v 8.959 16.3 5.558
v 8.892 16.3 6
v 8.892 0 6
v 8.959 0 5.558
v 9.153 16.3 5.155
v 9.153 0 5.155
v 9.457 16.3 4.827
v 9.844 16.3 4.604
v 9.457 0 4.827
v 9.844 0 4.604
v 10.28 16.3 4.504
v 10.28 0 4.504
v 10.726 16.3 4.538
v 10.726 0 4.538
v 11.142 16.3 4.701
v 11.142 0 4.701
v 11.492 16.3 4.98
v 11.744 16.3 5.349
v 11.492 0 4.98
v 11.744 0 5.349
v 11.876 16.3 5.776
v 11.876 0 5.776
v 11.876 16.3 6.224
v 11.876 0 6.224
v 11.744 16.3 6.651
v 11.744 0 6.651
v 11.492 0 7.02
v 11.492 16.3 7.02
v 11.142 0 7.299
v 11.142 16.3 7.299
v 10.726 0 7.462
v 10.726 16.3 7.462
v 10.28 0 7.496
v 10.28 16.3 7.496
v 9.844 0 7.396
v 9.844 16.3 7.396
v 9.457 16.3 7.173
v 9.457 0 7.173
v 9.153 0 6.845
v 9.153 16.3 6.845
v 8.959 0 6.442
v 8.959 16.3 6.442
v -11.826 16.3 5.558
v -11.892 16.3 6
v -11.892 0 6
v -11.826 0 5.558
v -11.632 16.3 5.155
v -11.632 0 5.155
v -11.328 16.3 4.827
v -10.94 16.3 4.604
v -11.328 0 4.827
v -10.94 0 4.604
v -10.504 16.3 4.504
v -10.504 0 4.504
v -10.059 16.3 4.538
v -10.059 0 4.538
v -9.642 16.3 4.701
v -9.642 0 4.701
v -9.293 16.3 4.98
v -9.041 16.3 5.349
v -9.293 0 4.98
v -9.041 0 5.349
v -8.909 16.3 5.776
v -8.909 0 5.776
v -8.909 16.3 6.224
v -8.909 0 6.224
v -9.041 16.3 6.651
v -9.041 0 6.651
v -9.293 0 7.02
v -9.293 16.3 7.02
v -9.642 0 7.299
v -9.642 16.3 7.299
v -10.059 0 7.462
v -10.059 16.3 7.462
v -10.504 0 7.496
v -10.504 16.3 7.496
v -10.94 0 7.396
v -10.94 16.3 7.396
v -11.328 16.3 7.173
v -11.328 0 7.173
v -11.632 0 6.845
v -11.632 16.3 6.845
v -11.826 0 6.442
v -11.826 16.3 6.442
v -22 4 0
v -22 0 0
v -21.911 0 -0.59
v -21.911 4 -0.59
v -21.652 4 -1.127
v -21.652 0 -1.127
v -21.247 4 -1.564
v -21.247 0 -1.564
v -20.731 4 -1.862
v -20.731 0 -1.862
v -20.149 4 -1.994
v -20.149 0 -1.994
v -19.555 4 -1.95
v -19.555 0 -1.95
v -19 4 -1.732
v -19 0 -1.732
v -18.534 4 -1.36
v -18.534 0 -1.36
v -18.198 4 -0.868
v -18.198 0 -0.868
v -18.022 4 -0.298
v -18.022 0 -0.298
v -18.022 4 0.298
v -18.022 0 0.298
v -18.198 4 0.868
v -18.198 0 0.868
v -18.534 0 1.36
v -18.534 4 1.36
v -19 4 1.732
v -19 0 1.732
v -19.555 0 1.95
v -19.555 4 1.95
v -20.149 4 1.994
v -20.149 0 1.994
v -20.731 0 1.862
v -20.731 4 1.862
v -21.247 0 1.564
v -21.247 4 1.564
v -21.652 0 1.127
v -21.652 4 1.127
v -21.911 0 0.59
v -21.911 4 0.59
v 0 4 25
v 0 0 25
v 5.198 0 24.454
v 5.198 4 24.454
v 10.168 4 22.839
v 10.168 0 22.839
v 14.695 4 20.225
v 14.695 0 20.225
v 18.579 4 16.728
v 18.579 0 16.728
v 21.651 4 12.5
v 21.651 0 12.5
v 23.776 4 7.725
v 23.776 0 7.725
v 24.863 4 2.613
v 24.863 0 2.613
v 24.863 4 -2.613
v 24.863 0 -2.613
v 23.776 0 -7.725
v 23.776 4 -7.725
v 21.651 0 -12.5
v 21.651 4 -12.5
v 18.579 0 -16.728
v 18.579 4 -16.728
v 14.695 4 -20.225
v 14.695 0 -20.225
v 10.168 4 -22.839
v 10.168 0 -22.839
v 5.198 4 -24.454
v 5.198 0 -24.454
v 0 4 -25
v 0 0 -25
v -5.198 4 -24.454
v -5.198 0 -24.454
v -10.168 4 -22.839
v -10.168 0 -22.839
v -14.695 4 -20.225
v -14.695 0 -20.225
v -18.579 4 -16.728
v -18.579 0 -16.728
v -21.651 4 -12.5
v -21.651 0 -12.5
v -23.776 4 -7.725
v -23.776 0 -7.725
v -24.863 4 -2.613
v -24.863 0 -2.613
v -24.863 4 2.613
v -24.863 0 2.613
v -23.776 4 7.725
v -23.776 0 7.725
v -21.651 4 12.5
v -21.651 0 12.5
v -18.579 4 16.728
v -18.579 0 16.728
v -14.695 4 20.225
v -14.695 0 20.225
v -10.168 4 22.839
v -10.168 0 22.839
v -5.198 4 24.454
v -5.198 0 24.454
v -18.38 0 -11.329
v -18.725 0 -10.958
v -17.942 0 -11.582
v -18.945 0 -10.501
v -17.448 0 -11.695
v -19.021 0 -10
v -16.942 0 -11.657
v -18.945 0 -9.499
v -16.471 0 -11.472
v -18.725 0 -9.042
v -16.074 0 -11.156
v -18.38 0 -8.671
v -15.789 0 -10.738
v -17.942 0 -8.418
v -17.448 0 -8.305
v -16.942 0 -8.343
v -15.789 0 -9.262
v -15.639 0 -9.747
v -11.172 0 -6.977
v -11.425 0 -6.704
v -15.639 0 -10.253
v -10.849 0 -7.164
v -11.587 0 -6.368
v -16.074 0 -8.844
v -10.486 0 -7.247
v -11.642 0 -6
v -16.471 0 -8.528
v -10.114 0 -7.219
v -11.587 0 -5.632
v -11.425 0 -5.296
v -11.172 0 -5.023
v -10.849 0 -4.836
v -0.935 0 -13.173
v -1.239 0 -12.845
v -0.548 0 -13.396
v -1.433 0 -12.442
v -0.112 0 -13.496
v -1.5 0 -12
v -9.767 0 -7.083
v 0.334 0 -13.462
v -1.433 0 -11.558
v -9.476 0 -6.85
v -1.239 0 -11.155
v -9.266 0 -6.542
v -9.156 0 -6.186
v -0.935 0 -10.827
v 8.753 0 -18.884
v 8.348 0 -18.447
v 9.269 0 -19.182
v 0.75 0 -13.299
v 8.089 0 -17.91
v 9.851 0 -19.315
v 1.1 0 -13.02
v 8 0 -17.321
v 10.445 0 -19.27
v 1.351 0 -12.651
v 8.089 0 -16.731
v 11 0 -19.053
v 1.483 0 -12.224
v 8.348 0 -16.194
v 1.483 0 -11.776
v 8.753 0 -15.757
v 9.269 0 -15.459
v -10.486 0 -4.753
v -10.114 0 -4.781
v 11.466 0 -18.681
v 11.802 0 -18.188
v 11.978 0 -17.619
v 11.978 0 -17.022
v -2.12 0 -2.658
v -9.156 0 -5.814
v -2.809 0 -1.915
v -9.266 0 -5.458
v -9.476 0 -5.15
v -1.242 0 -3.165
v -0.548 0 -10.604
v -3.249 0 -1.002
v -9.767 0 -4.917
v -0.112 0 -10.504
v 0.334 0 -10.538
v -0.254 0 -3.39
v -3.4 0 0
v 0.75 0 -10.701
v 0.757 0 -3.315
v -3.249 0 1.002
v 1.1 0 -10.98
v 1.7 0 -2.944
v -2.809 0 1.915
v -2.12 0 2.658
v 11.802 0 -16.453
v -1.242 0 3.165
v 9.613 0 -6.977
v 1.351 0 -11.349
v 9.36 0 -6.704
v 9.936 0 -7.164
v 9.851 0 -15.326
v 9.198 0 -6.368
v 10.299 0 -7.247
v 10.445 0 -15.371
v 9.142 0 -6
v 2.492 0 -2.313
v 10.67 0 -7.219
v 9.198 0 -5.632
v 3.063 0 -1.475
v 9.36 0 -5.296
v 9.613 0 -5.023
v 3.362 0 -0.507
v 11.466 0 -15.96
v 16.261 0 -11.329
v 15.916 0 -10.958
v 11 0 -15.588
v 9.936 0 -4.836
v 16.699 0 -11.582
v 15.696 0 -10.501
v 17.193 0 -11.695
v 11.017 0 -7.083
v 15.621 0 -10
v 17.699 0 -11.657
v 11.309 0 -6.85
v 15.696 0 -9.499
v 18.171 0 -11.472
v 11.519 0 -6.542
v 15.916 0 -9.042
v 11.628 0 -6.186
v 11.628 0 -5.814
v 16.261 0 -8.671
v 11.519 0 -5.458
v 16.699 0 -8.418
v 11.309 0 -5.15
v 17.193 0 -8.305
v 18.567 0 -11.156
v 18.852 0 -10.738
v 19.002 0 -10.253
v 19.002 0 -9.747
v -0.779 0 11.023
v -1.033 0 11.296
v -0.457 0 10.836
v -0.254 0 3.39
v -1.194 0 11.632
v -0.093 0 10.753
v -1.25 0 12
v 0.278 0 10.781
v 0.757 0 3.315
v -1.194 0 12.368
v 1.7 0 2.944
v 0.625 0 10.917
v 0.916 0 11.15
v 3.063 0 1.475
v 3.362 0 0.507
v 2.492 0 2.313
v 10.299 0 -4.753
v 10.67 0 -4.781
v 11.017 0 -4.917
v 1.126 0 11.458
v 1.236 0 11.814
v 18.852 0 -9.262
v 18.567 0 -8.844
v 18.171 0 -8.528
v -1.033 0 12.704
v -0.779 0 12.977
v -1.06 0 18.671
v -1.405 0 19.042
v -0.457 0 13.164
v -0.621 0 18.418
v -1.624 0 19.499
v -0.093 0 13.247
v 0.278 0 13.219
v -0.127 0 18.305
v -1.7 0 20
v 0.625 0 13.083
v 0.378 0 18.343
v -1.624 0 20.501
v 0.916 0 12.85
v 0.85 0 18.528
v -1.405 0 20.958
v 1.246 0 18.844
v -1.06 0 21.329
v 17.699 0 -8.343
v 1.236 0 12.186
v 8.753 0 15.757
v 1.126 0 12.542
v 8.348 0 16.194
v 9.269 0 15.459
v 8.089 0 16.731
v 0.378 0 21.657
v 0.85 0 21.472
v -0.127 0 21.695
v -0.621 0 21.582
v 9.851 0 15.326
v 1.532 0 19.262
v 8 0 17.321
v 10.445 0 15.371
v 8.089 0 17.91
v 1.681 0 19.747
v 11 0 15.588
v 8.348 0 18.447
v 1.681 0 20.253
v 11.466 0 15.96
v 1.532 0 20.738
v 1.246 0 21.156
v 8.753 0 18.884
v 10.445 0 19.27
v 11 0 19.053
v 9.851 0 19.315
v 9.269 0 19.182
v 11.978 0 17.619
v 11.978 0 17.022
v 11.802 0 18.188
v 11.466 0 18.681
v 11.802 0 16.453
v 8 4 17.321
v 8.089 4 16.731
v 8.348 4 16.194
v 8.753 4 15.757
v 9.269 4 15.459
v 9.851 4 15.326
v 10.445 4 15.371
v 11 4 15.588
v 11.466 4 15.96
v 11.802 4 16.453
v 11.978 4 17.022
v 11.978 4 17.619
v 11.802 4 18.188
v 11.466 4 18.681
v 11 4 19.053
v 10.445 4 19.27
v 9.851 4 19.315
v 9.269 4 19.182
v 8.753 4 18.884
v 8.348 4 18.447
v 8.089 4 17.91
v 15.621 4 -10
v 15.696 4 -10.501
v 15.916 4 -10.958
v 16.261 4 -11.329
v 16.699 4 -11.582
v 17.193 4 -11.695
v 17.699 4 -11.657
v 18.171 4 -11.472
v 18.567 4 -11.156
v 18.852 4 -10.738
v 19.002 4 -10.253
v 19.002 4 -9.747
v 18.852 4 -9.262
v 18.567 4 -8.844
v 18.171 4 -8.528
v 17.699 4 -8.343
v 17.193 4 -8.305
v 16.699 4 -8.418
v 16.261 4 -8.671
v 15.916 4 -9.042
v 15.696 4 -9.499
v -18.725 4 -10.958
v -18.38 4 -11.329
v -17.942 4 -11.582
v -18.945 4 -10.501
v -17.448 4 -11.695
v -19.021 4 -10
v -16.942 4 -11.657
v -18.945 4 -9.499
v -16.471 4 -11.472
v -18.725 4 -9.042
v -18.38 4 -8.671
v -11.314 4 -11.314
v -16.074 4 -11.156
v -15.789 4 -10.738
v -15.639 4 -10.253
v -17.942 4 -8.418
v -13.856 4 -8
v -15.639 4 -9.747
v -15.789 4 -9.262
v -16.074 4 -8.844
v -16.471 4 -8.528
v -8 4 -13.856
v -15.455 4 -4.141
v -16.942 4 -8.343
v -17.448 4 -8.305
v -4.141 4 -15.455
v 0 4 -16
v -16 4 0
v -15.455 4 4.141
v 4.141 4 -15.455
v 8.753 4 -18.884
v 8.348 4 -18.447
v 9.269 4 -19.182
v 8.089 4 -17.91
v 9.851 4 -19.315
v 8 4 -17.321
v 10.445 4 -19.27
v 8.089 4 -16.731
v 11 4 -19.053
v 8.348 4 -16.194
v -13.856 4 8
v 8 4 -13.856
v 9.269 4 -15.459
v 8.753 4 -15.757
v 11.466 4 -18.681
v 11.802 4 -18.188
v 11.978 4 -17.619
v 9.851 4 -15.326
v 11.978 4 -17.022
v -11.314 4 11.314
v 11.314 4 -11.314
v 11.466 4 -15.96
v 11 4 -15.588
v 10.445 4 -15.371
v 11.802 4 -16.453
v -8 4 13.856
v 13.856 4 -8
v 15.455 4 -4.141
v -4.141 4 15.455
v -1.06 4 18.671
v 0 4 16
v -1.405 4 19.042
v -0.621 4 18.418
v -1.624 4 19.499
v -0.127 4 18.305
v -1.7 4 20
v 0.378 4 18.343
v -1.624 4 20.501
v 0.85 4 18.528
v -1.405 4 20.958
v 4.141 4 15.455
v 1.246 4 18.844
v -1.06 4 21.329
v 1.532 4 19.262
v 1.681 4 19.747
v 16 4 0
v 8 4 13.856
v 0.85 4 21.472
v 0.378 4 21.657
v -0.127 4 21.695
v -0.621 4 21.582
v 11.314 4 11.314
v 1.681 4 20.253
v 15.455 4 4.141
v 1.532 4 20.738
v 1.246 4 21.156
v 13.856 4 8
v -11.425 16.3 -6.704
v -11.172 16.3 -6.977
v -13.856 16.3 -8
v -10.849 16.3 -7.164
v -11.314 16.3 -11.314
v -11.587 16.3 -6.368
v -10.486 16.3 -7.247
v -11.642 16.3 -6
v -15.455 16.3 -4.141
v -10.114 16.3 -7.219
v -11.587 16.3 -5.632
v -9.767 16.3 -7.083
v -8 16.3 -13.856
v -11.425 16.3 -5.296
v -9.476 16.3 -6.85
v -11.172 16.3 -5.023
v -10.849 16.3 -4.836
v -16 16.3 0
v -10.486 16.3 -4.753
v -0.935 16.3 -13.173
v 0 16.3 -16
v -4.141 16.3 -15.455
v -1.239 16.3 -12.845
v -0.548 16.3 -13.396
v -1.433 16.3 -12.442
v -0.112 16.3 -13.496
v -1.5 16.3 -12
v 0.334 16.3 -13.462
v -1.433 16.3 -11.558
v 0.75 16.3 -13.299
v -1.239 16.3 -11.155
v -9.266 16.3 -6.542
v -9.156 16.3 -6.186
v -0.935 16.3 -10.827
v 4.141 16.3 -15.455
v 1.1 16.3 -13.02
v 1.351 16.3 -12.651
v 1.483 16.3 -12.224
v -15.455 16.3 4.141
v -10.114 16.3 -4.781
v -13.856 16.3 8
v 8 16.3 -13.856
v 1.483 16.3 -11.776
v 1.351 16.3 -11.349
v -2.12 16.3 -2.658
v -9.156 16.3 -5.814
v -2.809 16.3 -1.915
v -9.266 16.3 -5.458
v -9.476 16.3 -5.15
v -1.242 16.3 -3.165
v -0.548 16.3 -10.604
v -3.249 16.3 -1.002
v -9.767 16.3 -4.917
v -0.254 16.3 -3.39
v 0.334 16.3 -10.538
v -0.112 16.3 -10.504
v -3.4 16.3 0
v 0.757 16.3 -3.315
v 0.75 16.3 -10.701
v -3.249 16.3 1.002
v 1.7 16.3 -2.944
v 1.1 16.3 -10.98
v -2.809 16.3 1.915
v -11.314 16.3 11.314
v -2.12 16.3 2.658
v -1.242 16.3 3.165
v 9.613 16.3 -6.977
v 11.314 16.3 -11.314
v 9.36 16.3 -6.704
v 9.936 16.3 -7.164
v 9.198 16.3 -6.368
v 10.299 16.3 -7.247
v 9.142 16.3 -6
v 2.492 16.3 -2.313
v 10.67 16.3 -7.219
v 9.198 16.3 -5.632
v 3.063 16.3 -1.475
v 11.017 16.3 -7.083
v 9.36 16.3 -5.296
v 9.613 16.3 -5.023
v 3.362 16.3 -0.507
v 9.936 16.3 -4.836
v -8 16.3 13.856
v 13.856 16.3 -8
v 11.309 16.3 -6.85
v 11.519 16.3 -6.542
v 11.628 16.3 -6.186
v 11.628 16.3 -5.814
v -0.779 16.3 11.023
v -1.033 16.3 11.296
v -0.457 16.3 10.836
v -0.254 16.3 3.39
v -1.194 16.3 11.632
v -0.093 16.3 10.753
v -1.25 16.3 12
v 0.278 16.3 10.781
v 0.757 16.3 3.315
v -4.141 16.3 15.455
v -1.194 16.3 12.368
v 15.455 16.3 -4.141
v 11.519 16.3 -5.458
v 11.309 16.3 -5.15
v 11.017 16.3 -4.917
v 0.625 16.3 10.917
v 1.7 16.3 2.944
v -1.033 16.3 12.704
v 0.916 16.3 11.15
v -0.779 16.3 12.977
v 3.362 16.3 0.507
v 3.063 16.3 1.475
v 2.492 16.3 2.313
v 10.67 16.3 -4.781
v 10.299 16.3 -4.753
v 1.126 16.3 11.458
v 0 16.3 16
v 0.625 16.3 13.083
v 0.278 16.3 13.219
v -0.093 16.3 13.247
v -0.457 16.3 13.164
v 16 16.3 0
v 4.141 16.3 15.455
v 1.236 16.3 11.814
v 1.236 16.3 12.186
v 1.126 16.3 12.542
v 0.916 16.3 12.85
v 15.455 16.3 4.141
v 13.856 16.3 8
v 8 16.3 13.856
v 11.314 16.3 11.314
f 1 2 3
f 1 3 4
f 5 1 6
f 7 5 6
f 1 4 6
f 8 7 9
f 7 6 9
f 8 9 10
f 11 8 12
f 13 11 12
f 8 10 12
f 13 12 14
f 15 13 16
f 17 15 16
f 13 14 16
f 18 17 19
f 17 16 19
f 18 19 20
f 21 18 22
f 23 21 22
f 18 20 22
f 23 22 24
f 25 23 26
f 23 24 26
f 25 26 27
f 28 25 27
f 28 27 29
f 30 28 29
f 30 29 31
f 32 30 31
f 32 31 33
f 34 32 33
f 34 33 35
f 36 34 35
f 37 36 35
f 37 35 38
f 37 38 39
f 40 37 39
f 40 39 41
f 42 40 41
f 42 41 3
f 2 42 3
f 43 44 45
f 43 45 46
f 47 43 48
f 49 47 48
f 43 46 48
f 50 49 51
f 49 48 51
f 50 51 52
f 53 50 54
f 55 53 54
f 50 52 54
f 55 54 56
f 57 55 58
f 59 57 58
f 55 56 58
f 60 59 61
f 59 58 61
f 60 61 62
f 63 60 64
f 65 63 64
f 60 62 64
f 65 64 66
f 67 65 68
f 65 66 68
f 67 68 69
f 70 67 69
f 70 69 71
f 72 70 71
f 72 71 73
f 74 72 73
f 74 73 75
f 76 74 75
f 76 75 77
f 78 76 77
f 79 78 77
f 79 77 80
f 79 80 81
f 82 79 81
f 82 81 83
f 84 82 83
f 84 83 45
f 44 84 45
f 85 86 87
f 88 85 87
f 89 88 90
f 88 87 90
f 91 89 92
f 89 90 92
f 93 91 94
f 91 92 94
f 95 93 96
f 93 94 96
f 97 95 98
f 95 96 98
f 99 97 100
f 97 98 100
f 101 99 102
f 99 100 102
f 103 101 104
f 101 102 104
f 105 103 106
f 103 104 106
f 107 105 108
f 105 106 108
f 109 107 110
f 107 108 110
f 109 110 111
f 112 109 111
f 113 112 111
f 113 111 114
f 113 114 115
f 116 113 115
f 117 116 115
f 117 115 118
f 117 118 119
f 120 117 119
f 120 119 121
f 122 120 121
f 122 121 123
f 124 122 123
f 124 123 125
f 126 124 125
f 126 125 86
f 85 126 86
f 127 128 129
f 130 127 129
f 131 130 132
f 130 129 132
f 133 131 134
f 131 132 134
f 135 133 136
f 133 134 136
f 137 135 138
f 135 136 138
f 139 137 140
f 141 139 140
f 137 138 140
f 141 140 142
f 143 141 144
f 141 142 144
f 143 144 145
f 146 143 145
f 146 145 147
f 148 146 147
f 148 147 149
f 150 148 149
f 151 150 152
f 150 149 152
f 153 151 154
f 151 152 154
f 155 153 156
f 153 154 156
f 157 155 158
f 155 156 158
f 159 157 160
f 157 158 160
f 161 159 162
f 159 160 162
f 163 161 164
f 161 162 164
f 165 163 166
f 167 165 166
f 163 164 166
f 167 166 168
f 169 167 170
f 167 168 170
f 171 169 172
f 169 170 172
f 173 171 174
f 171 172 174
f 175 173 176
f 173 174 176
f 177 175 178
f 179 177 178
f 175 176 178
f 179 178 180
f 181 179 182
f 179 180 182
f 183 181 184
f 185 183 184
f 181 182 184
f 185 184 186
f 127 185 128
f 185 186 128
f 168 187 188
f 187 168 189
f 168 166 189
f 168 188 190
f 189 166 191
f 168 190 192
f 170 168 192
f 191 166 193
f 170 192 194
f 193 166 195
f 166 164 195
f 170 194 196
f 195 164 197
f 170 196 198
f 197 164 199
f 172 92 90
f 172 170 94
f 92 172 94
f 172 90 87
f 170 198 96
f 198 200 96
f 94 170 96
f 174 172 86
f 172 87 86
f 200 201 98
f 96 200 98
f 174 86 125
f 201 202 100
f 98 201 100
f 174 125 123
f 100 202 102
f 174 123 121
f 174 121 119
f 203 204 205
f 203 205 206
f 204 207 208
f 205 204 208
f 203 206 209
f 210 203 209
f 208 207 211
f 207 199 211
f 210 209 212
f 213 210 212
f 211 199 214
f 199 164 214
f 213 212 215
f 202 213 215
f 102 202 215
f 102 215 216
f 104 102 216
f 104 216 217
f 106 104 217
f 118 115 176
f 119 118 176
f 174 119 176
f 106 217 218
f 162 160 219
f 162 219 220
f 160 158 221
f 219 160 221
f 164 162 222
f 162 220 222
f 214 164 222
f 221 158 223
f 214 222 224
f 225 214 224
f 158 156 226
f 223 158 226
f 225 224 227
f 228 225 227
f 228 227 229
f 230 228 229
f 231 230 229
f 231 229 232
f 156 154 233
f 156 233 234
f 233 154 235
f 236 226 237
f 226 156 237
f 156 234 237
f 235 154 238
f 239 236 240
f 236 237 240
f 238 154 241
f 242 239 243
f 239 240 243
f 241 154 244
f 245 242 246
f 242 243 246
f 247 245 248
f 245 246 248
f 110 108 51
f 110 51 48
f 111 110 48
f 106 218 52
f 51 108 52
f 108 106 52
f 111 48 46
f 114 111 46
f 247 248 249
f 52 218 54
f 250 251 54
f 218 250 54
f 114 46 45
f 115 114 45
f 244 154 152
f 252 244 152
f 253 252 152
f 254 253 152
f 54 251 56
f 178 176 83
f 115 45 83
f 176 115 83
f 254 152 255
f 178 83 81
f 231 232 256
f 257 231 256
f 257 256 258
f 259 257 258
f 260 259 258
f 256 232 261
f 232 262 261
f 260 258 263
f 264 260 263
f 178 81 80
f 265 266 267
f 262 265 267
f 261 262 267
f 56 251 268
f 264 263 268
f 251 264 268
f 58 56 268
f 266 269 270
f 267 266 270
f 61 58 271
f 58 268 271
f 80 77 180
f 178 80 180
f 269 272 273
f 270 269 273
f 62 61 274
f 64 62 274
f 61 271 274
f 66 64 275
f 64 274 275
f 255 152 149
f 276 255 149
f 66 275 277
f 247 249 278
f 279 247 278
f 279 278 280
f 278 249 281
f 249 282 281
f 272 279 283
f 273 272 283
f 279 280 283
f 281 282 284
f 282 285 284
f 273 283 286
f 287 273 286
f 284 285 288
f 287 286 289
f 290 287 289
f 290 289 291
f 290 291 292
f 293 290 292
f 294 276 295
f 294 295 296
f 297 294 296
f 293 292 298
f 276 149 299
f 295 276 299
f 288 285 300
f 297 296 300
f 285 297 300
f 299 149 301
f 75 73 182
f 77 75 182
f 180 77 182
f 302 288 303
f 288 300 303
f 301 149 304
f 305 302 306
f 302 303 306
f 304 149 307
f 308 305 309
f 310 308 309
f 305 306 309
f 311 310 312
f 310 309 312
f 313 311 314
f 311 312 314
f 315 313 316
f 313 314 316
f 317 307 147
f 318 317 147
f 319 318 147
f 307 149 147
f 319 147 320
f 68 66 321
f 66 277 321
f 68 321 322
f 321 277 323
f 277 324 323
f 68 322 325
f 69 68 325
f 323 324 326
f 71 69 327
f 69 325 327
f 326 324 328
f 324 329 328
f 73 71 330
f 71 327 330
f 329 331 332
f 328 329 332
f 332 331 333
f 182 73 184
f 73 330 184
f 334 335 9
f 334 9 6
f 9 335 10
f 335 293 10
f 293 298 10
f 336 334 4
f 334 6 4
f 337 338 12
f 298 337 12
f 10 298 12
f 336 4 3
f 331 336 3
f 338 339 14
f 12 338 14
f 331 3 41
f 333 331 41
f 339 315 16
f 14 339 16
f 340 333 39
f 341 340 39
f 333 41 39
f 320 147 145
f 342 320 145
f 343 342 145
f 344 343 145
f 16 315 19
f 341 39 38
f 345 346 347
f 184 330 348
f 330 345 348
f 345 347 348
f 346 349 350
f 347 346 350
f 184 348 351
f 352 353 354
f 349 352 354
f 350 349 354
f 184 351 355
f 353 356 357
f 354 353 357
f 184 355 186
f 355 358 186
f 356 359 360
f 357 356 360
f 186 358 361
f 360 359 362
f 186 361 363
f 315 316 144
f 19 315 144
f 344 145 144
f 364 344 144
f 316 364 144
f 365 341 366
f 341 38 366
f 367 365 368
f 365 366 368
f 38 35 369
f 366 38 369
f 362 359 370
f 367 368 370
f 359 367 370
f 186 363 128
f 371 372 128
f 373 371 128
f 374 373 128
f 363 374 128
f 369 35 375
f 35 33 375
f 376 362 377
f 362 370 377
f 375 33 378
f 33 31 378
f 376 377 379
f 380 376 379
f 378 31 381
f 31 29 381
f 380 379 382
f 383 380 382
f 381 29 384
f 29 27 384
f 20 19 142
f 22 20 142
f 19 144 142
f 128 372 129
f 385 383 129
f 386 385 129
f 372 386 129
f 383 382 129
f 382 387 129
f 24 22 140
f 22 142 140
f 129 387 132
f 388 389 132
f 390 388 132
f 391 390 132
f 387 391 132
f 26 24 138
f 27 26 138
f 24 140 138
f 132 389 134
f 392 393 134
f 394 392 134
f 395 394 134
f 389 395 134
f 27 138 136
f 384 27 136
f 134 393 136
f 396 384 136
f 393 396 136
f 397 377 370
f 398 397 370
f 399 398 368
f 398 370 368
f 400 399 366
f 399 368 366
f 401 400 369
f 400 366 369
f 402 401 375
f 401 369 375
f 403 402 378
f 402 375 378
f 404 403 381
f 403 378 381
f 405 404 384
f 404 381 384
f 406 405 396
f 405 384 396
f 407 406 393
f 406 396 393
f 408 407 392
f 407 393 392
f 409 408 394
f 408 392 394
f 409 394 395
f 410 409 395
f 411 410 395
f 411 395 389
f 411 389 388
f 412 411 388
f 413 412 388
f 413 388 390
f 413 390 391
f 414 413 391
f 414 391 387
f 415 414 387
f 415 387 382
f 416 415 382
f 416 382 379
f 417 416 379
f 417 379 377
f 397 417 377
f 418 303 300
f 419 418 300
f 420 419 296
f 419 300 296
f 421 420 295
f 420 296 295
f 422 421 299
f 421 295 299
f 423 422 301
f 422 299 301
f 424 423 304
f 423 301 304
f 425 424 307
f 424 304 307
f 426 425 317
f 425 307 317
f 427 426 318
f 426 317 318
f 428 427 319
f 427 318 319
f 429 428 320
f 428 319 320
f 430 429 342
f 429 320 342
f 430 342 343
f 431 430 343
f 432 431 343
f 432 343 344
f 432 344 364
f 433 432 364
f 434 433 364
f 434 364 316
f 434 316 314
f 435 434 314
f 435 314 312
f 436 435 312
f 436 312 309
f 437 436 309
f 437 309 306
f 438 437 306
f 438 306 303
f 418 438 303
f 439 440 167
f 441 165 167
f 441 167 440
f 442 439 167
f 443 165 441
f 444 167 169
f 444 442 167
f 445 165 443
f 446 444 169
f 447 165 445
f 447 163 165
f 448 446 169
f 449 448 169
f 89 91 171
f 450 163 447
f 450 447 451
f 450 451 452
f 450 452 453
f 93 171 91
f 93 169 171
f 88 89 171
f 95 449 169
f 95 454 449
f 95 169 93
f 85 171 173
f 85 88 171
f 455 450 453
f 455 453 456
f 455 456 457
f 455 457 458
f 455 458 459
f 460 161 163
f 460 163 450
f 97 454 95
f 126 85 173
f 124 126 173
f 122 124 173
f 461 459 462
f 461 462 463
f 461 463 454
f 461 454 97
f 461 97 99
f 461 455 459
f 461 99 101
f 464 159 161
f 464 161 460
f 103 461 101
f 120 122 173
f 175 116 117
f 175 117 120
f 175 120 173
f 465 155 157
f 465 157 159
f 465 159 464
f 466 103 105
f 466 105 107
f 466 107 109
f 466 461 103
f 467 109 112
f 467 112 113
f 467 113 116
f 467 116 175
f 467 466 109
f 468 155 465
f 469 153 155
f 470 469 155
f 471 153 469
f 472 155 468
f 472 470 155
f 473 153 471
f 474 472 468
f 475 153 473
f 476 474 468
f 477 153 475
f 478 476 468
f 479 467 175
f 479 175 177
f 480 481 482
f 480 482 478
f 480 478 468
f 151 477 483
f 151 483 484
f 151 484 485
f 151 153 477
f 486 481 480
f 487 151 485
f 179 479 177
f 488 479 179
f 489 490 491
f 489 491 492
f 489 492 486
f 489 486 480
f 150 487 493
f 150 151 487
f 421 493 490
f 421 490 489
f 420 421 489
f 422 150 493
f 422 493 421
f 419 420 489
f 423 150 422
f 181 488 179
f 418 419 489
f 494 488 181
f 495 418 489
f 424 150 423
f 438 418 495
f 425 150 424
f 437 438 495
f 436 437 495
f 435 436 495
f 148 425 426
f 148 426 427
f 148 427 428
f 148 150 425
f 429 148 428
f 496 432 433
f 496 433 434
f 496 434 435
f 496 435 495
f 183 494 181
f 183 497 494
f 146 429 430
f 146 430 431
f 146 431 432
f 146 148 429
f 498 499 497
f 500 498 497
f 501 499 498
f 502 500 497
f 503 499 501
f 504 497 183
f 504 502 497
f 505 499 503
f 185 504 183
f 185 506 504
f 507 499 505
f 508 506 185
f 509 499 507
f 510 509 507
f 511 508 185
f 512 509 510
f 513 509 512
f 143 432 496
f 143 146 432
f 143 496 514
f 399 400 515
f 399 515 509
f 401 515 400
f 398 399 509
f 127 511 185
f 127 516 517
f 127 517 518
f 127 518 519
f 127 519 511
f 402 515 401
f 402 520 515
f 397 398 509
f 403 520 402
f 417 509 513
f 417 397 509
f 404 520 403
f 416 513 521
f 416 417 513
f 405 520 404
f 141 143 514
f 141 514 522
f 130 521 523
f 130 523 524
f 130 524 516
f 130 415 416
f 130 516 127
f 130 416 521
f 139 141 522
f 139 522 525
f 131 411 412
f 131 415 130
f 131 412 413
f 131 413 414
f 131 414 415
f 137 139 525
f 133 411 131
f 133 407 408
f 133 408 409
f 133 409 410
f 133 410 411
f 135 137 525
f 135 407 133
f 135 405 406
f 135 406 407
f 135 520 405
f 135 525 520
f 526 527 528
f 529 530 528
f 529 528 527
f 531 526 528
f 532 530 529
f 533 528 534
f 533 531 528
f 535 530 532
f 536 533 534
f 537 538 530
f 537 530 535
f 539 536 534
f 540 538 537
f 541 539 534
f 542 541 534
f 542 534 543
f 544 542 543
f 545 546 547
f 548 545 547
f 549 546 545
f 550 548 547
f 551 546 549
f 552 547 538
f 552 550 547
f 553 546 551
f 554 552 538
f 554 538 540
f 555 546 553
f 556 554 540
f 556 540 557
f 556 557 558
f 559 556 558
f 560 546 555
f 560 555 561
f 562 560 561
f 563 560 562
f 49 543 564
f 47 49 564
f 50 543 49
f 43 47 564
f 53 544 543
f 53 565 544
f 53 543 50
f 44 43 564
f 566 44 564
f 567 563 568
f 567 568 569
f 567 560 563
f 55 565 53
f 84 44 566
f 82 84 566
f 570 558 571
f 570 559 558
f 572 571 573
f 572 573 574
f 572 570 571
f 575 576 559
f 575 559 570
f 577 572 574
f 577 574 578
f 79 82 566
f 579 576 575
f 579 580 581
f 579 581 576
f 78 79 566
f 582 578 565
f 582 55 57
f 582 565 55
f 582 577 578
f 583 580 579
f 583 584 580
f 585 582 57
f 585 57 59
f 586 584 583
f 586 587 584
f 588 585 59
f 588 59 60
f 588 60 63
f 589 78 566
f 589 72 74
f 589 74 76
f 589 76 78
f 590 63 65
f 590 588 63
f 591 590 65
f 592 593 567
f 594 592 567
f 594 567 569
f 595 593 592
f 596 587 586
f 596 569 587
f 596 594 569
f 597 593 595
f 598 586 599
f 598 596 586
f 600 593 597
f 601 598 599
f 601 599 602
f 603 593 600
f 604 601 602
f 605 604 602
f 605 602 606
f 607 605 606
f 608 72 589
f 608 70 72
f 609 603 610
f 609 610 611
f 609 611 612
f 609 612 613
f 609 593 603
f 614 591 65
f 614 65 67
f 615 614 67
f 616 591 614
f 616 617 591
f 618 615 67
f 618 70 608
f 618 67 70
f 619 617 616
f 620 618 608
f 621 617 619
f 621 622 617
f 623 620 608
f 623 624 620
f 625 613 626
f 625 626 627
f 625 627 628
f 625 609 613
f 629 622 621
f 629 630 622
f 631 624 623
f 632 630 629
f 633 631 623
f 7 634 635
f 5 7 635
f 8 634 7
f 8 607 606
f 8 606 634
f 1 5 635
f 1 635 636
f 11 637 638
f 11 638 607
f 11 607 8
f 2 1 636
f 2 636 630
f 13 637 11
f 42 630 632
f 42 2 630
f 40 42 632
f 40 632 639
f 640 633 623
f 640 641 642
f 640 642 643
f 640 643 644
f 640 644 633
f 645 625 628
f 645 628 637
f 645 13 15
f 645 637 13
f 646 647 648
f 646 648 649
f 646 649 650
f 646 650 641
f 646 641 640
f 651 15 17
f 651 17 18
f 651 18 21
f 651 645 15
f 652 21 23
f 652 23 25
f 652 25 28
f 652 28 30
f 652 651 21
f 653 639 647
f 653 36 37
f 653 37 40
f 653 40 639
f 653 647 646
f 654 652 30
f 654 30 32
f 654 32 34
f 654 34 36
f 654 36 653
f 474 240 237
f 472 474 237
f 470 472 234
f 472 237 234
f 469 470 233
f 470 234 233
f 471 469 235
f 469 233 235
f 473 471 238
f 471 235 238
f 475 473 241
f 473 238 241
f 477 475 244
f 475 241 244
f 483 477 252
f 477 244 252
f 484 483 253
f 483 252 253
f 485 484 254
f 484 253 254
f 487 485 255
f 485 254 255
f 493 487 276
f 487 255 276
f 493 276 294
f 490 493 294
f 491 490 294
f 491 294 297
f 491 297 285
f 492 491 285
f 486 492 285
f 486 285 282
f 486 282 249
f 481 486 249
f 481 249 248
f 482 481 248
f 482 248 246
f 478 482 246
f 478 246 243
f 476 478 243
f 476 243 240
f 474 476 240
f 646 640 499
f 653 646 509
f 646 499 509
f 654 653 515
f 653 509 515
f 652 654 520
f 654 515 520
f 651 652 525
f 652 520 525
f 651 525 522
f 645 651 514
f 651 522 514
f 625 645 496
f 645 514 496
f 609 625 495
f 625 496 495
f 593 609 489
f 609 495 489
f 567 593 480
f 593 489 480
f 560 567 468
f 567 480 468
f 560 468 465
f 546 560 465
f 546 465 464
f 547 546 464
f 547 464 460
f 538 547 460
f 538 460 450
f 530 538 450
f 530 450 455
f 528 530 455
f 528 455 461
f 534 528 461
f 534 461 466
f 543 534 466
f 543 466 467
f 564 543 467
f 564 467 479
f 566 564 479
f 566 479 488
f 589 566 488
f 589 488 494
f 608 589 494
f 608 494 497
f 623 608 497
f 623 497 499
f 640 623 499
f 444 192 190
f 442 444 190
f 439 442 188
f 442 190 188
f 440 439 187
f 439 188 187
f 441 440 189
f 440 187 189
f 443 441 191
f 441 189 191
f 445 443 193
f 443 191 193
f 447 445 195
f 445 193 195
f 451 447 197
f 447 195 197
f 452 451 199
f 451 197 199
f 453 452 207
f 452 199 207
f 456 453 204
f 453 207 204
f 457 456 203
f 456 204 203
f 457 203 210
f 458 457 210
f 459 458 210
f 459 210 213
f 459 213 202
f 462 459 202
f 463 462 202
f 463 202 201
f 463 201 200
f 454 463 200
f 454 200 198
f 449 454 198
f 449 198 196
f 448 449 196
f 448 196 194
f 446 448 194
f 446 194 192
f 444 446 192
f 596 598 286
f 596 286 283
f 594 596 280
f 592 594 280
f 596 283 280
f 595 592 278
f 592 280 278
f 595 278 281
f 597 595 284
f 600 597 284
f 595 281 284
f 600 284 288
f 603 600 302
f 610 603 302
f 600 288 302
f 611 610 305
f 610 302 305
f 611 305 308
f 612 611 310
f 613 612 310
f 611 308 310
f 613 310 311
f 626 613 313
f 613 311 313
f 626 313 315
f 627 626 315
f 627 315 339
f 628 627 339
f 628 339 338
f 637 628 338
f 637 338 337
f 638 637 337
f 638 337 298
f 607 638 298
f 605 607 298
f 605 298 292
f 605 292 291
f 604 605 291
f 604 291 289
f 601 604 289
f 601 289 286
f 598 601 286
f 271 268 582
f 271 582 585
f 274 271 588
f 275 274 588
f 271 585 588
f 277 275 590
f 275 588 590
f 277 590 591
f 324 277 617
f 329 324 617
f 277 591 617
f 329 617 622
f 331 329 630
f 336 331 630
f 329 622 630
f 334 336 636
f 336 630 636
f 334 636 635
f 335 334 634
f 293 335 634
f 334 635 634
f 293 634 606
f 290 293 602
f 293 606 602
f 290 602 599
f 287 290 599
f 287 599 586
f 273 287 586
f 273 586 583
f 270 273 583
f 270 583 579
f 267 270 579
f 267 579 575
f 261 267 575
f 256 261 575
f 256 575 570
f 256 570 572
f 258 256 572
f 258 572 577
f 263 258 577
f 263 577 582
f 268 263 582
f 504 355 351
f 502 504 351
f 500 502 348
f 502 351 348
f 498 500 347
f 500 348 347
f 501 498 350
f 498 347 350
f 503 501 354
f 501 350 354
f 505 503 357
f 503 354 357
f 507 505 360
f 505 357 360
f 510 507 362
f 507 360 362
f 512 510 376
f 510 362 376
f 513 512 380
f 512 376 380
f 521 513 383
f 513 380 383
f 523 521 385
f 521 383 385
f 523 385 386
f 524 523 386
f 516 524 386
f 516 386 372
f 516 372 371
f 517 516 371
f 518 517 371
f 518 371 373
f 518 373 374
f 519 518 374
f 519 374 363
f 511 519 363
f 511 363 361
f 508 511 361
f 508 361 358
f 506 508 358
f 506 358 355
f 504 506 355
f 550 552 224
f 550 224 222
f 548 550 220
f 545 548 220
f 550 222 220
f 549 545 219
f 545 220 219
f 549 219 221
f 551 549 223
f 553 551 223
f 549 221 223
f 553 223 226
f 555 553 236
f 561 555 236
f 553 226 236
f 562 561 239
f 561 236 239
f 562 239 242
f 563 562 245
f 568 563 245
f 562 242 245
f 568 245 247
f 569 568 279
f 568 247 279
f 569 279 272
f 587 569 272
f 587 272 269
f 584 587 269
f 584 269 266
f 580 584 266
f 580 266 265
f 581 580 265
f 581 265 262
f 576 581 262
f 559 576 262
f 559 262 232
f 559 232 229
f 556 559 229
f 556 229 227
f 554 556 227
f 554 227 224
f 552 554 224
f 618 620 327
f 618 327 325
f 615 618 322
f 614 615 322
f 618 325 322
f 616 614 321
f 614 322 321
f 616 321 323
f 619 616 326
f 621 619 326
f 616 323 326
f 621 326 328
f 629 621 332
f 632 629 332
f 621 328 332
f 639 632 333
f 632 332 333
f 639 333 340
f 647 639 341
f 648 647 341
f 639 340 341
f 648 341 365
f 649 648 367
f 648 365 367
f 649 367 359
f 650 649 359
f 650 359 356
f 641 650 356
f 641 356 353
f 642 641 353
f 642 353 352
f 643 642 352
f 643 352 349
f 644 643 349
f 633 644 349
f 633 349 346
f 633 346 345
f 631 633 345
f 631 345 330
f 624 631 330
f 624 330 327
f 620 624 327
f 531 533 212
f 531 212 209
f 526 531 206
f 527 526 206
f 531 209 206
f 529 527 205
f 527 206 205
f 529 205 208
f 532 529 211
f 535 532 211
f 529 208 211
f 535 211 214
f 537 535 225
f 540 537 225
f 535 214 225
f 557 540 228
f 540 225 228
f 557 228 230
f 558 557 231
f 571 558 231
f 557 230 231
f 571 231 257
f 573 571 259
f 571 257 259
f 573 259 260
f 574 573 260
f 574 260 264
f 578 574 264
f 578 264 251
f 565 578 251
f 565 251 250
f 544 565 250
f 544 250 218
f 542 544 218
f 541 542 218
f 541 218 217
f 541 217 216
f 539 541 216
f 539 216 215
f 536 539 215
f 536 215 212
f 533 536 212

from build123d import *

# Parameters (mm, degrees)
SKETCH1_R               = 25
BOSS_EXTRUDE1_DEPTH     = 4
F_4_0MM_DOWEL_HOLE1_D   = 4
M3_CLEARANCE_HOLE1_D    = 3.4
BOSS_EXTRUDE2_START     = -4
SKETCH9_R               = 16
BOSS_EXTRUDE2_DEPTH     = 16.3
TAP_DRILL_FOR_TAP1_D    = 6.8
F_3_0MM_DOWEL_HOLE1_D   = 3
TAP_DRILL_FOR_M3_TAP1_D = 2.5


with BuildPart() as part:
    # Sketch1 → Boss-Extrude1 (new body)
    with BuildSketch(Plane(origin=(0, 0, 0), x_dir=(1, 0, 0), z_dir=(0, 1, 0))):
        with Locations(Location((0, 0, 0), (0, 0, 270))):
            Circle(SKETCH1_R)
    extrude(amount=BOSS_EXTRUDE1_DEPTH)

    # Ø4.0mm Dowel Hole1 (through all)
    with Locations(Plane(origin=(0, 4, 0), x_dir=(1, 0, 0), z_dir=(0, 1, 0))):
        with Locations((10, -17.320508076), (-20, 0), (10, 17.320508076)):
            Hole(F_4_0MM_DOWEL_HOLE1_D / 2)

    # M3 Clearance Hole1 (through all)
    with Locations(Plane(origin=(0, 4, 0), x_dir=(1, 0, 0), z_dir=(0, 1, 0))):
        with Locations((17.320508076, 10), (0, -20), (-17.320508076, 10)):
            Hole(M3_CLEARANCE_HOLE1_D / 2)

    # Sketch9 → Boss-Extrude2 (add)
    with BuildSketch(Plane(origin=(0, 4, 0), x_dir=(1, 0, 0), z_dir=(0, 1, 0)).offset(BOSS_EXTRUDE2_START)):
        with Locations(Location((0, 0, 0), (0, 0, 270))):
            Circle(SKETCH9_R)
    extrude(amount=BOSS_EXTRUDE2_DEPTH)

    # Tap Drill for  Tap1 (through all)
    with Locations(Plane.XZ):
        with Locations((0, 0)):
            Hole(TAP_DRILL_FOR_TAP1_D / 2)

    # Ø3.0mm Dowel Hole1 (through all)
    with Locations(Plane(origin=(0, 16.3, 0), x_dir=(1, 0, 0), z_dir=(0, 1, 0))):
        with Locations((-10.392304845, -6), (0, 12), (10.392304845, -6)):
            Hole(F_3_0MM_DOWEL_HOLE1_D / 2)

    # Tap Drill for M3 Tap1 (through all)
    with Locations(Plane(origin=(0, 16.3, 0), x_dir=(1, 0, 0), z_dir=(0, 1, 0))):
        with Locations((10.392304845, 6), (0, -12), (-10.392304845, 6)):
            Hole(TAP_DRILL_FOR_M3_TAP1_D / 2)


solid = part.part
